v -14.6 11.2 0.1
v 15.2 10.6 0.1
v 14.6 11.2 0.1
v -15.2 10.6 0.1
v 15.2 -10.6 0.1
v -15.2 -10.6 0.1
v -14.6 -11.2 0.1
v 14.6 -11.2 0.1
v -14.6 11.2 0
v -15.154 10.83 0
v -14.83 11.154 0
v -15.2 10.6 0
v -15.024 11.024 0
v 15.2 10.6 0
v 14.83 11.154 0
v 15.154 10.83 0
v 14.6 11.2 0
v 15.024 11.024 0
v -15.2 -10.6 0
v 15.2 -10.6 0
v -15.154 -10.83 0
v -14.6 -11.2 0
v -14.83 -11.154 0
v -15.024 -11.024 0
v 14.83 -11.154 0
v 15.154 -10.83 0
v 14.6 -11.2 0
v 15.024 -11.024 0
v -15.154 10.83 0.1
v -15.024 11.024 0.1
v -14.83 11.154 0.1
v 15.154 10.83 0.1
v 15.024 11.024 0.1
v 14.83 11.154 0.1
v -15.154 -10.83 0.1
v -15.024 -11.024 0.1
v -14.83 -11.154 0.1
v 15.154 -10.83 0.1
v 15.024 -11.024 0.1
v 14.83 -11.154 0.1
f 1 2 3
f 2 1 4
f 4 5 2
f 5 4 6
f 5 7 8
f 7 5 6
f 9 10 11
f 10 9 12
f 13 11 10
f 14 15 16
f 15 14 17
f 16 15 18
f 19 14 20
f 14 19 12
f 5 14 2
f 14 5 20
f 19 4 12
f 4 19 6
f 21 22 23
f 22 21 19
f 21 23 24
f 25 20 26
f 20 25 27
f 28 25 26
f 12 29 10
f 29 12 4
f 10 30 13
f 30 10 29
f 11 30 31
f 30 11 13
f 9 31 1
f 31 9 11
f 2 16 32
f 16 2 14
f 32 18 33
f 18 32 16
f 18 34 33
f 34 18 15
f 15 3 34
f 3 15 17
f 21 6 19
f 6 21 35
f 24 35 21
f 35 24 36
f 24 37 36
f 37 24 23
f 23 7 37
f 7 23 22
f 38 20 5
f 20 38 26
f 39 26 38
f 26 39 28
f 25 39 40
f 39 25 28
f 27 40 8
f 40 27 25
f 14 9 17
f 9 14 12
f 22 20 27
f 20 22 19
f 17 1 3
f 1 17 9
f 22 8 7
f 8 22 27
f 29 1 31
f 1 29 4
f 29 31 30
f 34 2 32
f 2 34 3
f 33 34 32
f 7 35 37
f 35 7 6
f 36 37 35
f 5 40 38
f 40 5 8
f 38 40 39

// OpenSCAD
// file: ../p/box3u12.scad
use <../lib.scad>
function ldraw_lib__box3u12() = [
// 0 Box with 3 Parallel Faces without Any Edges
// 0 Name: box3u12.dat
// 0 Author: J.C. Tchang [tchang]
// 0 !LDRAW_ORG Primitive UPDATE 2014-02
// 0 !LICENSE Licensed under CC BY 4.0 : see CAreadme.txt
// 
// 0 BFC CERTIFY CCW
  [0,"BFC","CERTIFY"],
  [0,"BFC","CCW"],
// 
// 0 !HISTORY 2014-12-23 [PTadmin] Official Update 2014-02
// 
// 
// 4 16 -1 1 1 1 1 1 1 1 -1 -1 1 -1
  [4,16,-1,1,1,1,1,1,1,1,-1,-1,1,-1],
// 4 16 -1 1 1 -1 0 1 1 0 1 1 1 1
  [4,16,-1,1,1,-1,0,1,1,0,1,1,1,1],
// 4 16 1 1 -1 1 0 -1 -1 0 -1 -1 1 -1
  [4,16,1,1,-1,1,0,-1,-1,0,-1,-1,1,-1],
];
module ldraw_lib__box3u12(step=0, col=false, unit=2/5, alt=false, line=0.2, solid=!$preview)
    makepoly(ldraw_lib__box3u12(), step=step, col=col, unit=unit, alt=alt, line=line, solid=solid);
ldraw_lib__box3u12(line=0.2);
// file: ../p/1-4cyli.scad
use <../lib.scad>
function ldraw_lib__1_4cyli() = [
// 0 Cylinder 0.25
// 0 Name: 1-4cyli.dat
// 0 Author: James Jessiman
// 0 !LDRAW_ORG Primitive UPDATE 2012-01
// 0 !LICENSE Licensed under CC BY 4.0 : see CAreadme.txt
// 
// 0 BFC CERTIFY CCW
  [0,"BFC","CERTIFY"],
  [0,"BFC","CCW"],
// 
// 0 !HISTORY 2002-03-23 [sbliss] Added BFC statement.
// 0 !HISTORY 2002-04-25 [PTadmin] Official Update 2002-02
// 0 !HISTORY 2007-06-22 [PTadmin] Header formatted for Contributor Agreement
// 0 !HISTORY 2008-07-01 [PTadmin] Official Update 2008-01
// 0 !HISTORY 2012-02-16 [Philo] Changed to CCW
// 0 !HISTORY 2012-03-30 [PTadmin] Official Update 2012-01
// 
// 
// 4 16 1 1 0 0.9239 1 0.3827 0.9239 0 0.3827 1 0 0
  [4,16,1,1,0,0.9239,1,0.3827,0.9239,0,0.3827,1,0,0],
// 5 24 1 0 0 1 1 0 0.9239 0 0.3827 1 0 -1
  [5,24,1,0,0,1,1,0,0.9239,0,0.3827,1,0,-1],
// 4 16 0.9239 1 0.3827 0.7071 1 0.7071 0.7071 0 0.7071 0.9239 0 0.3827
  [4,16,0.9239,1,0.3827,0.7071,1,0.7071,0.7071,0,0.7071,0.9239,0,0.3827],
// 5 24 0.9239 0 0.3827 0.9239 1 0.3827 0.7071 0 0.7071 1 0 0
  [5,24,0.9239,0,0.3827,0.9239,1,0.3827,0.7071,0,0.7071,1,0,0],
// 4 16 0.7071 1 0.7071 0.3827 1 0.9239 0.3827 0 0.9239 0.7071 0 0.7071
  [4,16,0.7071,1,0.7071,0.3827,1,0.9239,0.3827,0,0.9239,0.7071,0,0.7071],
// 5 24 0.7071 0 0.7071 0.7071 1 0.7071 0.3827 0 0.9239 0.9239 0 0.3827
  [5,24,0.7071,0,0.7071,0.7071,1,0.7071,0.3827,0,0.9239,0.9239,0,0.3827],
// 4 16 0.3827 1 0.9239 0 1 1 0 0 1 0.3827 0 0.9239
  [4,16,0.3827,1,0.9239,0,1,1,0,0,1,0.3827,0,0.9239],
// 5 24 0.3827 0 0.9239 0.3827 1 0.9239 0 0 1 0.7071 0 0.7071
  [5,24,0.3827,0,0.9239,0.3827,1,0.9239,0,0,1,0.7071,0,0.7071],
// 5 24 0 0 1 0 1 1 0.3827 0 0.9239 -1 0 1
  [5,24,0,0,1,0,1,1,0.3827,0,0.9239,-1,0,1],
];
module ldraw_lib__1_4cyli(step=0, col=false, unit=2/5, alt=false, line=0.2, solid=!$preview)
    makepoly(ldraw_lib__1_4cyli(), step=step, col=col, unit=unit, alt=alt, line=line, solid=solid);
ldraw_lib__1_4cyli(line=0.2);
// file: s/stickerback028x038.scad
use <../../lib.scad>
use <../../p/1-4chrd.scad>
use <../../p/1-4cyli.scad>
use <../../p/box3u12.scad>
function ldraw_lib__s__stickerback028x038() = [
// 0 ~Sticker Back  2.8 x  3.8
// 0 Name: s\stickerback028x038.dat
// 0 Author: Massimo Maso [Sirio]
// 0 !LDRAW_ORG Subpart UPDATE 2025-08
// 0 !LICENSE Licensed under CC BY 4.0 : see CAreadme.txt
// 
// 0 BFC CERTIFY CCW
  [0,"BFC","CERTIFY"],
  [0,"BFC","CCW"],
// 
// 0 !HISTORY 2025-08-31 [OrionP] Official Update 2025-08
// 
// 0 // Primitives
// 1 16 -36.5 0 26.5 -1.5 0 0 0 -1 0 0 0 1.5 1-4chrd.dat
  [1,16,-36.5,0,26.5,-1.5,0,0,0,-1,0,0,0,1.5, ldraw_lib__1_4chrd()],
// 1 16 36.5 0 26.5 1.5 0 0 0 -1 0 0 0 1.5 1-4chrd.dat
  [1,16,36.5,0,26.5,1.5,0,0,0,-1,0,0,0,1.5, ldraw_lib__1_4chrd()],
// 1 16 0 -.25 0 0 0 38 0 .25 0 26.5 0 0 box3u12.dat
  [1,16,0,-.25,0,0,0,38,0,.25,0,26.5,0,0, ldraw_lib__box3u12()],
// 1 16 -36.5 0 -26.5 -1.5 0 0 0 -1 0 0 0 -1.5 1-4chrd.dat
  [1,16,-36.5,0,-26.5,-1.5,0,0,0,-1,0,0,0,-1.5, ldraw_lib__1_4chrd()],
// 1 16 36.5 0 -26.5 1.5 0 0 0 -1 0 0 0 -1.5 1-4chrd.dat
  [1,16,36.5,0,-26.5,1.5,0,0,0,-1,0,0,0,-1.5, ldraw_lib__1_4chrd()],
// 1 16 -36.5 0 26.5 -1.5 0 0 0 -.25 0 0 0 1.5 1-4cyli.dat
  [1,16,-36.5,0,26.5,-1.5,0,0,0,-.25,0,0,0,1.5, ldraw_lib__1_4cyli()],
// 1 16 36.5 0 26.5 1.5 0 0 0 -.25 0 0 0 1.5 1-4cyli.dat
  [1,16,36.5,0,26.5,1.5,0,0,0,-.25,0,0,0,1.5, ldraw_lib__1_4cyli()],
// 1 16 -36.5 0 -26.5 -1.5 0 0 0 -.25 0 0 0 -1.5 1-4cyli.dat
  [1,16,-36.5,0,-26.5,-1.5,0,0,0,-.25,0,0,0,-1.5, ldraw_lib__1_4cyli()],
// 1 16 36.5 0 -26.5 1.5 0 0 0 -.25 0 0 0 -1.5 1-4cyli.dat
  [1,16,36.5,0,-26.5,1.5,0,0,0,-.25,0,0,0,-1.5, ldraw_lib__1_4cyli()],
// 0 // Bottom face
// 4 16 36.5 0 28 38 0 26.5 -38 0 26.5 -36.5 0 28
  [4,16,36.5,0,28,38,0,26.5,-38,0,26.5,-36.5,0,28],
// 4 16 38 0 -26.5 36.5 0 -28 -36.5 0 -28 -38 0 -26.5
  [4,16,38,0,-26.5,36.5,0,-28,-36.5,0,-28,-38,0,-26.5],
// 0 // Lateral face
// 4 16 -36.5 0 28 -36.5 -.25 28 36.5 -.25 28 36.5 0 28
  [4,16,-36.5,0,28,-36.5,-.25,28,36.5,-.25,28,36.5,0,28],
// 4 16 -36.5 0 -28 36.5 0 -28 36.5 -.25 -28 -36.5 -.25 -28
  [4,16,-36.5,0,-28,36.5,0,-28,36.5,-.25,-28,-36.5,-.25,-28],
];
module ldraw_lib__s__stickerback028x038(step=0, col=false, unit=2/5, alt=false, line=0.2, solid=!$preview)
    makepoly(ldraw_lib__s__stickerback028x038(), step=step, col=col, unit=unit, alt=alt, line=line, solid=solid);
ldraw_lib__s__stickerback028x038(line=0.2);
// file: ../p/1-4chrd.scad
use <../lib.scad>
function ldraw_lib__1_4chrd() = [
// 0 Chord 0.25
// 0 Name: 1-4chrd.dat
// 0 Author: Max Martin Richter [MMR1988]
// 0 !LDRAW_ORG Primitive UPDATE 2023-05
// 0 !LICENSE Licensed under CC BY 4.0 : see CAreadme.txt
// 
// 0 BFC CERTIFY CCW
  [0,"BFC","CERTIFY"],
  [0,"BFC","CCW"],
// 
// 0 !HISTORY 2004-04-22 [PTadmin] Official Update 2004-02
// 0 !HISTORY 2007-10-09 [PTadmin] Header formatted for Contributor Agreement
// 0 !HISTORY 2008-07-01 [PTadmin] Official Update 2008-01
// 0 !HISTORY 2012-08-02 [MMR1988] Re-creation with PrimGen2 and Rectifier
// 0 !HISTORY 2012-08-09 [PTadmin] Official Update 2012-02
// 0 !HISTORY 2023-10-27 [OrionP] Change author to MMR1988 from hafhead
// 0 !HISTORY 2023-10-31 [OrionP] Official Update 2023-05
// 
// 4 16 0.9239 0 0.3827 0.3827 0 0.9239 0 0 1 1 0 0
  [4,16,0.9239,0,0.3827,0.3827,0,0.9239,0,0,1,1,0,0],
// 3 16 0.7071 0 0.7071 0.3827 0 0.9239 0.9239 0 0.3827
  [3,16,0.7071,0,0.7071,0.3827,0,0.9239,0.9239,0,0.3827],
];
module ldraw_lib__1_4chrd(step=0, col=false, unit=2/5, alt=false, line=0.2, solid=!$preview)
    makepoly(ldraw_lib__1_4chrd(), step=step, col=col, unit=unit, alt=alt, line=line, solid=solid);
ldraw_lib__1_4chrd(line=0.2);
// main file
use <../lib.scad>
use <../p/1-4chrd.scad>
use <s/stickerback028x038.scad>
function ldraw_lib__6177960l() = [
// 0 Sticker  2.8 x  3.8 with Car Design on Halftone Sheet on White Background
// 0 Name: 6177960l.dat
// 0 Author: Massimo Maso [Sirio]
// 0 !LDRAW_ORG Part UPDATE 2025-08
// 0 !LICENSE Licensed under CC BY 4.0 : see CAreadme.txt
// 
// 0 BFC CERTIFY CCW
  [0,"BFC","CERTIFY"],
  [0,"BFC","CCW"],
// 
// 0 !KEYWORDS 720S, BrickLink 75880stk01, McLaren, Rebrickable 30896, Set 75880
// 0 !KEYWORDS Speed Champions
// 
// 0 !HISTORY 2025-08-31 [OrionP] Official Update 2025-08
// 
// 0 // Textures
// 0 !TEXMAP START PLANAR -38 0 28 38 0 28 -38 0 -28 6177960l.png
// 0 !: 4 15 -38 -.25 26.5 38 -.25 26.5 36.5 -.25 28 -36.5 -.25 28
// 0 !: 4 15 -38 -.25 26.5 -38 -.25 -26.5 38 -.25 -26.5 38 -.25 26.5
// 0 !: 4 15 -38 -.25 -26.5 -36.5 -.25 -28 36.5 -.25 -28 38 -.25 -26.5
// 0 !TEXMAP FALLBACK
// 4 15 -38 -.25 26.5 38 -.25 26.5 36.5 -.25 28 -36.5 -.25 28
  [4,15,-38,-.25,26.5,38,-.25,26.5,36.5,-.25,28,-36.5,-.25,28],
// 4 15 -38 -.25 26.5 -38 -.25 -26.5 38 -.25 -26.5 38 -.25 26.5
  [4,15,-38,-.25,26.5,-38,-.25,-26.5,38,-.25,-26.5,38,-.25,26.5],
// 4 15 -38 -.25 -26.5 -36.5 -.25 -28 36.5 -.25 -28 38 -.25 -26.5
  [4,15,-38,-.25,-26.5,-36.5,-.25,-28,36.5,-.25,-28,38,-.25,-26.5],
// 0 !TEXMAP END
// 0 // Stickerback
// 1 16 0 0 0 1 0 0 0 1 0 0 0 1 s\stickerback028x038.dat
  [1,16,0,0,0,1,0,0,0,1,0,0,0,1, ldraw_lib__s__stickerback028x038()],
// 0 // Primitives
// 1 15 -36.5 -.25 26.5 -1.5 0 0 0 1 0 0 0 1.5 1-4chrd.dat
  [1,15,-36.5,-.25,26.5,-1.5,0,0,0,1,0,0,0,1.5, ldraw_lib__1_4chrd()],
// 1 15 36.5 -.25 26.5 1.5 0 0 0 1 0 0 0 1.5 1-4chrd.dat
  [1,15,36.5,-.25,26.5,1.5,0,0,0,1,0,0,0,1.5, ldraw_lib__1_4chrd()],
// 1 15 -36.5 -.25 -26.5 -1.5 0 0 0 1 0 0 0 -1.5 1-4chrd.dat
  [1,15,-36.5,-.25,-26.5,-1.5,0,0,0,1,0,0,0,-1.5, ldraw_lib__1_4chrd()],
// 1 15 36.5 -.25 -26.5 1.5 0 0 0 1 0 0 0 -1.5 1-4chrd.dat
  [1,15,36.5,-.25,-26.5,1.5,0,0,0,1,0,0,0,-1.5, ldraw_lib__1_4chrd()],
];
module ldraw_lib__6177960l(step=0, col=false, unit=2/5, alt=false, line=0.2, solid=!$preview)
    makepoly(ldraw_lib__6177960l(), step=step, col=col, unit=unit, alt=alt, line=line, solid=solid);
ldraw_lib__6177960l(line=0.2);
